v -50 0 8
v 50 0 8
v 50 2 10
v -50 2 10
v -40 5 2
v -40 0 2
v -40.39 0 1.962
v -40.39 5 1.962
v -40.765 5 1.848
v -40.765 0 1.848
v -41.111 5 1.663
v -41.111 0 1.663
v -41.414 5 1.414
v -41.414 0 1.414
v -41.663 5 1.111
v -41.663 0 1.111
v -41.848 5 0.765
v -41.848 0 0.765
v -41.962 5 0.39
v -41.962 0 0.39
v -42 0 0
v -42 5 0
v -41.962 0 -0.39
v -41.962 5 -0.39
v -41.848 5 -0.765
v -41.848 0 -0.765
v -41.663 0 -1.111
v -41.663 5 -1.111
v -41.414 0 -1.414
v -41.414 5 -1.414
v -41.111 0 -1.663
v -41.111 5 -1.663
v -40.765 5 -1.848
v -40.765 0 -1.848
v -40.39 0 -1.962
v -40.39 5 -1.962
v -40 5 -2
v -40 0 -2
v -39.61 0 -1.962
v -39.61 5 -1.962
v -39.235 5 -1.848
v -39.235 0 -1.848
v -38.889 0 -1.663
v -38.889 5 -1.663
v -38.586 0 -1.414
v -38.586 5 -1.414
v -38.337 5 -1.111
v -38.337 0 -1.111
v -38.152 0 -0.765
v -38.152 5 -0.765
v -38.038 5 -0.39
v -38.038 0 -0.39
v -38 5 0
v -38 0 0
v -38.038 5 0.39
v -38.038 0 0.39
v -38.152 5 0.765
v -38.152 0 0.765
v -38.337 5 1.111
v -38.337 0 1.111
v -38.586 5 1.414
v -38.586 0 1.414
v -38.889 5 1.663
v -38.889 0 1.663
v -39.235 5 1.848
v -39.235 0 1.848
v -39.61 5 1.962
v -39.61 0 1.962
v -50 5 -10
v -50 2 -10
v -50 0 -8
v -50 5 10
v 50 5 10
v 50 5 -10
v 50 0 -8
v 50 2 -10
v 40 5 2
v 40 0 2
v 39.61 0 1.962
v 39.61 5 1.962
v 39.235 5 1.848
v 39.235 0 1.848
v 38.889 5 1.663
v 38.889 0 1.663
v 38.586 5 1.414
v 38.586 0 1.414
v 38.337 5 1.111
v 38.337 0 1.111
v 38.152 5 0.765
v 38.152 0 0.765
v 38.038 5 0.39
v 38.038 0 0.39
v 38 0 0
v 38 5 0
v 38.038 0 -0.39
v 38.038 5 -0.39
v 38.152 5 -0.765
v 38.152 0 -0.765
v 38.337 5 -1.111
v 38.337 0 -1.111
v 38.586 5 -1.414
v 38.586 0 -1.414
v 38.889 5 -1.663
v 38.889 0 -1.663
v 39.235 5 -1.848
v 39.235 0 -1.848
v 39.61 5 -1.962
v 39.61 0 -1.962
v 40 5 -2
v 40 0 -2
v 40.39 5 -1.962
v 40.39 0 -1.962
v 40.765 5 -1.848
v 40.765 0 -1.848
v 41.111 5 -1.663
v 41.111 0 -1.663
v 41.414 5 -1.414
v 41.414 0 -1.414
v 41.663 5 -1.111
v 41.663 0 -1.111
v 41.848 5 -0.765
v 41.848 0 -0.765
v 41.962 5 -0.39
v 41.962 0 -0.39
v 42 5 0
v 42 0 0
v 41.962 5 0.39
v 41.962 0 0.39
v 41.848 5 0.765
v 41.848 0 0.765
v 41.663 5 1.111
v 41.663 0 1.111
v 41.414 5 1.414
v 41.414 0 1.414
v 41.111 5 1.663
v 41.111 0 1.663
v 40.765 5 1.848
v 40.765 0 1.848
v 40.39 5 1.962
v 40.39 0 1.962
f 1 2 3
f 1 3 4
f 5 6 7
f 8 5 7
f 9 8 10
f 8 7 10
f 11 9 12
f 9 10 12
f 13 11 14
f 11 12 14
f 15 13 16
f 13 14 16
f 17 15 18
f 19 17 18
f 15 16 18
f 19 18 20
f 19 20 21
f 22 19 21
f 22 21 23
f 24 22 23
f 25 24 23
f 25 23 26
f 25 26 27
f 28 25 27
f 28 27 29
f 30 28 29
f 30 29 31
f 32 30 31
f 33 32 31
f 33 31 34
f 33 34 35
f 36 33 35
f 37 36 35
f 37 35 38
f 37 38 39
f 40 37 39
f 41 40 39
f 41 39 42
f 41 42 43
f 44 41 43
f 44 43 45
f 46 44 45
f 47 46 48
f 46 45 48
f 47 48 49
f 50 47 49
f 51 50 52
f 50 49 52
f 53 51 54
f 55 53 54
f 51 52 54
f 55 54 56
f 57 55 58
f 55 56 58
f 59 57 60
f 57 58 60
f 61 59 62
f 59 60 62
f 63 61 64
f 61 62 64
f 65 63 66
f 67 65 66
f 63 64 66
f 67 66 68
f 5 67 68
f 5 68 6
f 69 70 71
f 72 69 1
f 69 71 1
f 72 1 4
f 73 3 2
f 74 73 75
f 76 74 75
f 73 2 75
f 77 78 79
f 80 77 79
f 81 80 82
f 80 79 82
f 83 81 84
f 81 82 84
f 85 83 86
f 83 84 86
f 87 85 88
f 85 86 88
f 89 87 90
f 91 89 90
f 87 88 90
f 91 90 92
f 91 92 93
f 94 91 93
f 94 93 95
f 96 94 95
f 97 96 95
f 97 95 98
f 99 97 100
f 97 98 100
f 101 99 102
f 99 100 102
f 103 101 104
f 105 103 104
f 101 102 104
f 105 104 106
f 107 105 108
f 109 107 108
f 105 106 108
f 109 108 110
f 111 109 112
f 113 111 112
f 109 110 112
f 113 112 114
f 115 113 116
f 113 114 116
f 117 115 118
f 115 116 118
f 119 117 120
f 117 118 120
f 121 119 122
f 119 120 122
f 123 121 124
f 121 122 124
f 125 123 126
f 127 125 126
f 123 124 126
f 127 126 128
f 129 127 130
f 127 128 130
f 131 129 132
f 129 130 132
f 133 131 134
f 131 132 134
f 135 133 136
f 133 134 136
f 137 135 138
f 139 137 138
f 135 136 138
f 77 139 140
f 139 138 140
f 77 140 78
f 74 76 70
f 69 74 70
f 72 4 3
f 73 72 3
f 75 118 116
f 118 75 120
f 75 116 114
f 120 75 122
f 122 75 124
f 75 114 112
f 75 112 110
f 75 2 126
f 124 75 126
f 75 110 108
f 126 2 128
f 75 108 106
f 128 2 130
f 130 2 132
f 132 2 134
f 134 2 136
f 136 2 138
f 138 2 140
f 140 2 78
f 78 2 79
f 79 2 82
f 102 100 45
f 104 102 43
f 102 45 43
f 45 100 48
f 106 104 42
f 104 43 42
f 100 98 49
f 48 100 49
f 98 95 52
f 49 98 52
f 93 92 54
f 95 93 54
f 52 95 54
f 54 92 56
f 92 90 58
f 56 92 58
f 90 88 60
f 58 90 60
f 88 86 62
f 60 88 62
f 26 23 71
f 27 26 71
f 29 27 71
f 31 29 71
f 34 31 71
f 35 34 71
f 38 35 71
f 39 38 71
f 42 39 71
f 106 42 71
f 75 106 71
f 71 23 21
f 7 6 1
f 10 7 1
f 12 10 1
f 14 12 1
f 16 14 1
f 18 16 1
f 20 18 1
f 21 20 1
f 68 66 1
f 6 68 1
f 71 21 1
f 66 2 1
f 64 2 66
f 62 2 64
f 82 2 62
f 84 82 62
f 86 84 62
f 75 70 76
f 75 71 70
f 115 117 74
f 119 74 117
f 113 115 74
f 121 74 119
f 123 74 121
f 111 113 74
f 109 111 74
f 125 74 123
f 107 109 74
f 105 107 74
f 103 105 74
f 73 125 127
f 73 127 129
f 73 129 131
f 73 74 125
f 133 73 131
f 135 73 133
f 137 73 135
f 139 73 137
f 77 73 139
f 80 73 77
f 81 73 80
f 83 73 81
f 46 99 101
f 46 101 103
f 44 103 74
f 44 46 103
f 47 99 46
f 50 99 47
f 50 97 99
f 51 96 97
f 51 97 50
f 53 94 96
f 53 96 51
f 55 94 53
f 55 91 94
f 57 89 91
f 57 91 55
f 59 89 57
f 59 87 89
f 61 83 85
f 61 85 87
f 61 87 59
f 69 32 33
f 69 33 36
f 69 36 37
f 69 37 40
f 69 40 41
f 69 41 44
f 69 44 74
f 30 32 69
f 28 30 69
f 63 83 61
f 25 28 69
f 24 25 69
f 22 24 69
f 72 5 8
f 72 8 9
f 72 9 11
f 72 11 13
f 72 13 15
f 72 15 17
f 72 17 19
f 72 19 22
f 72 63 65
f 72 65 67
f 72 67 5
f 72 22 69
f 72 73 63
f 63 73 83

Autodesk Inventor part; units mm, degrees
ref_plane "YZ Plane" through (0, 0, 0) normal (1, 0, 0) x (0, 1, 0)
ref_plane "XZ Plane" through (0, 0, 0) normal (0, 1, 0) x (-1, 0, 0)
ref_plane "XY Plane" through (0, 0, 0) normal (0, 0, 1) x (1, 0, 0)
sketch "Sketch1" plane through (0, 0, 0) normal (0, 1, 0) x (-1, 0, 0)
  line L0 (-50, -10) -> (50, -10)
  line L1 (50, -10) -> (50, 10)
  line L2 (50, 10) -> (-50, 10)
  line L3 (-50, 10) -> (-50, -10)
  line L4 (-50, -10) -> (50, 10) construction
  line L5 (50, -10) -> (-50, 10) construction
  point P0 (0, 0)
  dimension "d0" = 100
  dimension "d1" = 20
extrude "Extrusion1" add sketch "Sketch1" along normal blind 5
sketch "Sketch2" plane through (0, 5, 0) normal (0, 1, 0) x (1, 0, 0)
  line L0 (-50, 10) -> (-50, -10) projected
  line L1 (-50, 0) -> (-40, 0)
  line L2 (50, -10) -> (50, 10) projected
  line L3 (50, 0) -> (40, 0)
  point P0 (0, 0)
  dimension "d4" = 10
  dimension "d5" = 10
hole "Hole1" at (-40, 5, 0) direction (0, -1, 0) diameter 4 depth 6
hole "Hole2" at (40, 5, 0) direction (0, -1, 0) diameter 4 depth 6
chamfer "Chamfer1" distance 2 angle 45 2 edges at (0, 0, 10) (0, 0, -10)
thread "Thread1" size "M4x0.7" class "6H" standard "ANSI Metric M Profile" length 5
thread "Thread2" size "M4x0.7" class "6H" standard "ANSI Metric M Profile" length 5
properties part number "Rail stand"
